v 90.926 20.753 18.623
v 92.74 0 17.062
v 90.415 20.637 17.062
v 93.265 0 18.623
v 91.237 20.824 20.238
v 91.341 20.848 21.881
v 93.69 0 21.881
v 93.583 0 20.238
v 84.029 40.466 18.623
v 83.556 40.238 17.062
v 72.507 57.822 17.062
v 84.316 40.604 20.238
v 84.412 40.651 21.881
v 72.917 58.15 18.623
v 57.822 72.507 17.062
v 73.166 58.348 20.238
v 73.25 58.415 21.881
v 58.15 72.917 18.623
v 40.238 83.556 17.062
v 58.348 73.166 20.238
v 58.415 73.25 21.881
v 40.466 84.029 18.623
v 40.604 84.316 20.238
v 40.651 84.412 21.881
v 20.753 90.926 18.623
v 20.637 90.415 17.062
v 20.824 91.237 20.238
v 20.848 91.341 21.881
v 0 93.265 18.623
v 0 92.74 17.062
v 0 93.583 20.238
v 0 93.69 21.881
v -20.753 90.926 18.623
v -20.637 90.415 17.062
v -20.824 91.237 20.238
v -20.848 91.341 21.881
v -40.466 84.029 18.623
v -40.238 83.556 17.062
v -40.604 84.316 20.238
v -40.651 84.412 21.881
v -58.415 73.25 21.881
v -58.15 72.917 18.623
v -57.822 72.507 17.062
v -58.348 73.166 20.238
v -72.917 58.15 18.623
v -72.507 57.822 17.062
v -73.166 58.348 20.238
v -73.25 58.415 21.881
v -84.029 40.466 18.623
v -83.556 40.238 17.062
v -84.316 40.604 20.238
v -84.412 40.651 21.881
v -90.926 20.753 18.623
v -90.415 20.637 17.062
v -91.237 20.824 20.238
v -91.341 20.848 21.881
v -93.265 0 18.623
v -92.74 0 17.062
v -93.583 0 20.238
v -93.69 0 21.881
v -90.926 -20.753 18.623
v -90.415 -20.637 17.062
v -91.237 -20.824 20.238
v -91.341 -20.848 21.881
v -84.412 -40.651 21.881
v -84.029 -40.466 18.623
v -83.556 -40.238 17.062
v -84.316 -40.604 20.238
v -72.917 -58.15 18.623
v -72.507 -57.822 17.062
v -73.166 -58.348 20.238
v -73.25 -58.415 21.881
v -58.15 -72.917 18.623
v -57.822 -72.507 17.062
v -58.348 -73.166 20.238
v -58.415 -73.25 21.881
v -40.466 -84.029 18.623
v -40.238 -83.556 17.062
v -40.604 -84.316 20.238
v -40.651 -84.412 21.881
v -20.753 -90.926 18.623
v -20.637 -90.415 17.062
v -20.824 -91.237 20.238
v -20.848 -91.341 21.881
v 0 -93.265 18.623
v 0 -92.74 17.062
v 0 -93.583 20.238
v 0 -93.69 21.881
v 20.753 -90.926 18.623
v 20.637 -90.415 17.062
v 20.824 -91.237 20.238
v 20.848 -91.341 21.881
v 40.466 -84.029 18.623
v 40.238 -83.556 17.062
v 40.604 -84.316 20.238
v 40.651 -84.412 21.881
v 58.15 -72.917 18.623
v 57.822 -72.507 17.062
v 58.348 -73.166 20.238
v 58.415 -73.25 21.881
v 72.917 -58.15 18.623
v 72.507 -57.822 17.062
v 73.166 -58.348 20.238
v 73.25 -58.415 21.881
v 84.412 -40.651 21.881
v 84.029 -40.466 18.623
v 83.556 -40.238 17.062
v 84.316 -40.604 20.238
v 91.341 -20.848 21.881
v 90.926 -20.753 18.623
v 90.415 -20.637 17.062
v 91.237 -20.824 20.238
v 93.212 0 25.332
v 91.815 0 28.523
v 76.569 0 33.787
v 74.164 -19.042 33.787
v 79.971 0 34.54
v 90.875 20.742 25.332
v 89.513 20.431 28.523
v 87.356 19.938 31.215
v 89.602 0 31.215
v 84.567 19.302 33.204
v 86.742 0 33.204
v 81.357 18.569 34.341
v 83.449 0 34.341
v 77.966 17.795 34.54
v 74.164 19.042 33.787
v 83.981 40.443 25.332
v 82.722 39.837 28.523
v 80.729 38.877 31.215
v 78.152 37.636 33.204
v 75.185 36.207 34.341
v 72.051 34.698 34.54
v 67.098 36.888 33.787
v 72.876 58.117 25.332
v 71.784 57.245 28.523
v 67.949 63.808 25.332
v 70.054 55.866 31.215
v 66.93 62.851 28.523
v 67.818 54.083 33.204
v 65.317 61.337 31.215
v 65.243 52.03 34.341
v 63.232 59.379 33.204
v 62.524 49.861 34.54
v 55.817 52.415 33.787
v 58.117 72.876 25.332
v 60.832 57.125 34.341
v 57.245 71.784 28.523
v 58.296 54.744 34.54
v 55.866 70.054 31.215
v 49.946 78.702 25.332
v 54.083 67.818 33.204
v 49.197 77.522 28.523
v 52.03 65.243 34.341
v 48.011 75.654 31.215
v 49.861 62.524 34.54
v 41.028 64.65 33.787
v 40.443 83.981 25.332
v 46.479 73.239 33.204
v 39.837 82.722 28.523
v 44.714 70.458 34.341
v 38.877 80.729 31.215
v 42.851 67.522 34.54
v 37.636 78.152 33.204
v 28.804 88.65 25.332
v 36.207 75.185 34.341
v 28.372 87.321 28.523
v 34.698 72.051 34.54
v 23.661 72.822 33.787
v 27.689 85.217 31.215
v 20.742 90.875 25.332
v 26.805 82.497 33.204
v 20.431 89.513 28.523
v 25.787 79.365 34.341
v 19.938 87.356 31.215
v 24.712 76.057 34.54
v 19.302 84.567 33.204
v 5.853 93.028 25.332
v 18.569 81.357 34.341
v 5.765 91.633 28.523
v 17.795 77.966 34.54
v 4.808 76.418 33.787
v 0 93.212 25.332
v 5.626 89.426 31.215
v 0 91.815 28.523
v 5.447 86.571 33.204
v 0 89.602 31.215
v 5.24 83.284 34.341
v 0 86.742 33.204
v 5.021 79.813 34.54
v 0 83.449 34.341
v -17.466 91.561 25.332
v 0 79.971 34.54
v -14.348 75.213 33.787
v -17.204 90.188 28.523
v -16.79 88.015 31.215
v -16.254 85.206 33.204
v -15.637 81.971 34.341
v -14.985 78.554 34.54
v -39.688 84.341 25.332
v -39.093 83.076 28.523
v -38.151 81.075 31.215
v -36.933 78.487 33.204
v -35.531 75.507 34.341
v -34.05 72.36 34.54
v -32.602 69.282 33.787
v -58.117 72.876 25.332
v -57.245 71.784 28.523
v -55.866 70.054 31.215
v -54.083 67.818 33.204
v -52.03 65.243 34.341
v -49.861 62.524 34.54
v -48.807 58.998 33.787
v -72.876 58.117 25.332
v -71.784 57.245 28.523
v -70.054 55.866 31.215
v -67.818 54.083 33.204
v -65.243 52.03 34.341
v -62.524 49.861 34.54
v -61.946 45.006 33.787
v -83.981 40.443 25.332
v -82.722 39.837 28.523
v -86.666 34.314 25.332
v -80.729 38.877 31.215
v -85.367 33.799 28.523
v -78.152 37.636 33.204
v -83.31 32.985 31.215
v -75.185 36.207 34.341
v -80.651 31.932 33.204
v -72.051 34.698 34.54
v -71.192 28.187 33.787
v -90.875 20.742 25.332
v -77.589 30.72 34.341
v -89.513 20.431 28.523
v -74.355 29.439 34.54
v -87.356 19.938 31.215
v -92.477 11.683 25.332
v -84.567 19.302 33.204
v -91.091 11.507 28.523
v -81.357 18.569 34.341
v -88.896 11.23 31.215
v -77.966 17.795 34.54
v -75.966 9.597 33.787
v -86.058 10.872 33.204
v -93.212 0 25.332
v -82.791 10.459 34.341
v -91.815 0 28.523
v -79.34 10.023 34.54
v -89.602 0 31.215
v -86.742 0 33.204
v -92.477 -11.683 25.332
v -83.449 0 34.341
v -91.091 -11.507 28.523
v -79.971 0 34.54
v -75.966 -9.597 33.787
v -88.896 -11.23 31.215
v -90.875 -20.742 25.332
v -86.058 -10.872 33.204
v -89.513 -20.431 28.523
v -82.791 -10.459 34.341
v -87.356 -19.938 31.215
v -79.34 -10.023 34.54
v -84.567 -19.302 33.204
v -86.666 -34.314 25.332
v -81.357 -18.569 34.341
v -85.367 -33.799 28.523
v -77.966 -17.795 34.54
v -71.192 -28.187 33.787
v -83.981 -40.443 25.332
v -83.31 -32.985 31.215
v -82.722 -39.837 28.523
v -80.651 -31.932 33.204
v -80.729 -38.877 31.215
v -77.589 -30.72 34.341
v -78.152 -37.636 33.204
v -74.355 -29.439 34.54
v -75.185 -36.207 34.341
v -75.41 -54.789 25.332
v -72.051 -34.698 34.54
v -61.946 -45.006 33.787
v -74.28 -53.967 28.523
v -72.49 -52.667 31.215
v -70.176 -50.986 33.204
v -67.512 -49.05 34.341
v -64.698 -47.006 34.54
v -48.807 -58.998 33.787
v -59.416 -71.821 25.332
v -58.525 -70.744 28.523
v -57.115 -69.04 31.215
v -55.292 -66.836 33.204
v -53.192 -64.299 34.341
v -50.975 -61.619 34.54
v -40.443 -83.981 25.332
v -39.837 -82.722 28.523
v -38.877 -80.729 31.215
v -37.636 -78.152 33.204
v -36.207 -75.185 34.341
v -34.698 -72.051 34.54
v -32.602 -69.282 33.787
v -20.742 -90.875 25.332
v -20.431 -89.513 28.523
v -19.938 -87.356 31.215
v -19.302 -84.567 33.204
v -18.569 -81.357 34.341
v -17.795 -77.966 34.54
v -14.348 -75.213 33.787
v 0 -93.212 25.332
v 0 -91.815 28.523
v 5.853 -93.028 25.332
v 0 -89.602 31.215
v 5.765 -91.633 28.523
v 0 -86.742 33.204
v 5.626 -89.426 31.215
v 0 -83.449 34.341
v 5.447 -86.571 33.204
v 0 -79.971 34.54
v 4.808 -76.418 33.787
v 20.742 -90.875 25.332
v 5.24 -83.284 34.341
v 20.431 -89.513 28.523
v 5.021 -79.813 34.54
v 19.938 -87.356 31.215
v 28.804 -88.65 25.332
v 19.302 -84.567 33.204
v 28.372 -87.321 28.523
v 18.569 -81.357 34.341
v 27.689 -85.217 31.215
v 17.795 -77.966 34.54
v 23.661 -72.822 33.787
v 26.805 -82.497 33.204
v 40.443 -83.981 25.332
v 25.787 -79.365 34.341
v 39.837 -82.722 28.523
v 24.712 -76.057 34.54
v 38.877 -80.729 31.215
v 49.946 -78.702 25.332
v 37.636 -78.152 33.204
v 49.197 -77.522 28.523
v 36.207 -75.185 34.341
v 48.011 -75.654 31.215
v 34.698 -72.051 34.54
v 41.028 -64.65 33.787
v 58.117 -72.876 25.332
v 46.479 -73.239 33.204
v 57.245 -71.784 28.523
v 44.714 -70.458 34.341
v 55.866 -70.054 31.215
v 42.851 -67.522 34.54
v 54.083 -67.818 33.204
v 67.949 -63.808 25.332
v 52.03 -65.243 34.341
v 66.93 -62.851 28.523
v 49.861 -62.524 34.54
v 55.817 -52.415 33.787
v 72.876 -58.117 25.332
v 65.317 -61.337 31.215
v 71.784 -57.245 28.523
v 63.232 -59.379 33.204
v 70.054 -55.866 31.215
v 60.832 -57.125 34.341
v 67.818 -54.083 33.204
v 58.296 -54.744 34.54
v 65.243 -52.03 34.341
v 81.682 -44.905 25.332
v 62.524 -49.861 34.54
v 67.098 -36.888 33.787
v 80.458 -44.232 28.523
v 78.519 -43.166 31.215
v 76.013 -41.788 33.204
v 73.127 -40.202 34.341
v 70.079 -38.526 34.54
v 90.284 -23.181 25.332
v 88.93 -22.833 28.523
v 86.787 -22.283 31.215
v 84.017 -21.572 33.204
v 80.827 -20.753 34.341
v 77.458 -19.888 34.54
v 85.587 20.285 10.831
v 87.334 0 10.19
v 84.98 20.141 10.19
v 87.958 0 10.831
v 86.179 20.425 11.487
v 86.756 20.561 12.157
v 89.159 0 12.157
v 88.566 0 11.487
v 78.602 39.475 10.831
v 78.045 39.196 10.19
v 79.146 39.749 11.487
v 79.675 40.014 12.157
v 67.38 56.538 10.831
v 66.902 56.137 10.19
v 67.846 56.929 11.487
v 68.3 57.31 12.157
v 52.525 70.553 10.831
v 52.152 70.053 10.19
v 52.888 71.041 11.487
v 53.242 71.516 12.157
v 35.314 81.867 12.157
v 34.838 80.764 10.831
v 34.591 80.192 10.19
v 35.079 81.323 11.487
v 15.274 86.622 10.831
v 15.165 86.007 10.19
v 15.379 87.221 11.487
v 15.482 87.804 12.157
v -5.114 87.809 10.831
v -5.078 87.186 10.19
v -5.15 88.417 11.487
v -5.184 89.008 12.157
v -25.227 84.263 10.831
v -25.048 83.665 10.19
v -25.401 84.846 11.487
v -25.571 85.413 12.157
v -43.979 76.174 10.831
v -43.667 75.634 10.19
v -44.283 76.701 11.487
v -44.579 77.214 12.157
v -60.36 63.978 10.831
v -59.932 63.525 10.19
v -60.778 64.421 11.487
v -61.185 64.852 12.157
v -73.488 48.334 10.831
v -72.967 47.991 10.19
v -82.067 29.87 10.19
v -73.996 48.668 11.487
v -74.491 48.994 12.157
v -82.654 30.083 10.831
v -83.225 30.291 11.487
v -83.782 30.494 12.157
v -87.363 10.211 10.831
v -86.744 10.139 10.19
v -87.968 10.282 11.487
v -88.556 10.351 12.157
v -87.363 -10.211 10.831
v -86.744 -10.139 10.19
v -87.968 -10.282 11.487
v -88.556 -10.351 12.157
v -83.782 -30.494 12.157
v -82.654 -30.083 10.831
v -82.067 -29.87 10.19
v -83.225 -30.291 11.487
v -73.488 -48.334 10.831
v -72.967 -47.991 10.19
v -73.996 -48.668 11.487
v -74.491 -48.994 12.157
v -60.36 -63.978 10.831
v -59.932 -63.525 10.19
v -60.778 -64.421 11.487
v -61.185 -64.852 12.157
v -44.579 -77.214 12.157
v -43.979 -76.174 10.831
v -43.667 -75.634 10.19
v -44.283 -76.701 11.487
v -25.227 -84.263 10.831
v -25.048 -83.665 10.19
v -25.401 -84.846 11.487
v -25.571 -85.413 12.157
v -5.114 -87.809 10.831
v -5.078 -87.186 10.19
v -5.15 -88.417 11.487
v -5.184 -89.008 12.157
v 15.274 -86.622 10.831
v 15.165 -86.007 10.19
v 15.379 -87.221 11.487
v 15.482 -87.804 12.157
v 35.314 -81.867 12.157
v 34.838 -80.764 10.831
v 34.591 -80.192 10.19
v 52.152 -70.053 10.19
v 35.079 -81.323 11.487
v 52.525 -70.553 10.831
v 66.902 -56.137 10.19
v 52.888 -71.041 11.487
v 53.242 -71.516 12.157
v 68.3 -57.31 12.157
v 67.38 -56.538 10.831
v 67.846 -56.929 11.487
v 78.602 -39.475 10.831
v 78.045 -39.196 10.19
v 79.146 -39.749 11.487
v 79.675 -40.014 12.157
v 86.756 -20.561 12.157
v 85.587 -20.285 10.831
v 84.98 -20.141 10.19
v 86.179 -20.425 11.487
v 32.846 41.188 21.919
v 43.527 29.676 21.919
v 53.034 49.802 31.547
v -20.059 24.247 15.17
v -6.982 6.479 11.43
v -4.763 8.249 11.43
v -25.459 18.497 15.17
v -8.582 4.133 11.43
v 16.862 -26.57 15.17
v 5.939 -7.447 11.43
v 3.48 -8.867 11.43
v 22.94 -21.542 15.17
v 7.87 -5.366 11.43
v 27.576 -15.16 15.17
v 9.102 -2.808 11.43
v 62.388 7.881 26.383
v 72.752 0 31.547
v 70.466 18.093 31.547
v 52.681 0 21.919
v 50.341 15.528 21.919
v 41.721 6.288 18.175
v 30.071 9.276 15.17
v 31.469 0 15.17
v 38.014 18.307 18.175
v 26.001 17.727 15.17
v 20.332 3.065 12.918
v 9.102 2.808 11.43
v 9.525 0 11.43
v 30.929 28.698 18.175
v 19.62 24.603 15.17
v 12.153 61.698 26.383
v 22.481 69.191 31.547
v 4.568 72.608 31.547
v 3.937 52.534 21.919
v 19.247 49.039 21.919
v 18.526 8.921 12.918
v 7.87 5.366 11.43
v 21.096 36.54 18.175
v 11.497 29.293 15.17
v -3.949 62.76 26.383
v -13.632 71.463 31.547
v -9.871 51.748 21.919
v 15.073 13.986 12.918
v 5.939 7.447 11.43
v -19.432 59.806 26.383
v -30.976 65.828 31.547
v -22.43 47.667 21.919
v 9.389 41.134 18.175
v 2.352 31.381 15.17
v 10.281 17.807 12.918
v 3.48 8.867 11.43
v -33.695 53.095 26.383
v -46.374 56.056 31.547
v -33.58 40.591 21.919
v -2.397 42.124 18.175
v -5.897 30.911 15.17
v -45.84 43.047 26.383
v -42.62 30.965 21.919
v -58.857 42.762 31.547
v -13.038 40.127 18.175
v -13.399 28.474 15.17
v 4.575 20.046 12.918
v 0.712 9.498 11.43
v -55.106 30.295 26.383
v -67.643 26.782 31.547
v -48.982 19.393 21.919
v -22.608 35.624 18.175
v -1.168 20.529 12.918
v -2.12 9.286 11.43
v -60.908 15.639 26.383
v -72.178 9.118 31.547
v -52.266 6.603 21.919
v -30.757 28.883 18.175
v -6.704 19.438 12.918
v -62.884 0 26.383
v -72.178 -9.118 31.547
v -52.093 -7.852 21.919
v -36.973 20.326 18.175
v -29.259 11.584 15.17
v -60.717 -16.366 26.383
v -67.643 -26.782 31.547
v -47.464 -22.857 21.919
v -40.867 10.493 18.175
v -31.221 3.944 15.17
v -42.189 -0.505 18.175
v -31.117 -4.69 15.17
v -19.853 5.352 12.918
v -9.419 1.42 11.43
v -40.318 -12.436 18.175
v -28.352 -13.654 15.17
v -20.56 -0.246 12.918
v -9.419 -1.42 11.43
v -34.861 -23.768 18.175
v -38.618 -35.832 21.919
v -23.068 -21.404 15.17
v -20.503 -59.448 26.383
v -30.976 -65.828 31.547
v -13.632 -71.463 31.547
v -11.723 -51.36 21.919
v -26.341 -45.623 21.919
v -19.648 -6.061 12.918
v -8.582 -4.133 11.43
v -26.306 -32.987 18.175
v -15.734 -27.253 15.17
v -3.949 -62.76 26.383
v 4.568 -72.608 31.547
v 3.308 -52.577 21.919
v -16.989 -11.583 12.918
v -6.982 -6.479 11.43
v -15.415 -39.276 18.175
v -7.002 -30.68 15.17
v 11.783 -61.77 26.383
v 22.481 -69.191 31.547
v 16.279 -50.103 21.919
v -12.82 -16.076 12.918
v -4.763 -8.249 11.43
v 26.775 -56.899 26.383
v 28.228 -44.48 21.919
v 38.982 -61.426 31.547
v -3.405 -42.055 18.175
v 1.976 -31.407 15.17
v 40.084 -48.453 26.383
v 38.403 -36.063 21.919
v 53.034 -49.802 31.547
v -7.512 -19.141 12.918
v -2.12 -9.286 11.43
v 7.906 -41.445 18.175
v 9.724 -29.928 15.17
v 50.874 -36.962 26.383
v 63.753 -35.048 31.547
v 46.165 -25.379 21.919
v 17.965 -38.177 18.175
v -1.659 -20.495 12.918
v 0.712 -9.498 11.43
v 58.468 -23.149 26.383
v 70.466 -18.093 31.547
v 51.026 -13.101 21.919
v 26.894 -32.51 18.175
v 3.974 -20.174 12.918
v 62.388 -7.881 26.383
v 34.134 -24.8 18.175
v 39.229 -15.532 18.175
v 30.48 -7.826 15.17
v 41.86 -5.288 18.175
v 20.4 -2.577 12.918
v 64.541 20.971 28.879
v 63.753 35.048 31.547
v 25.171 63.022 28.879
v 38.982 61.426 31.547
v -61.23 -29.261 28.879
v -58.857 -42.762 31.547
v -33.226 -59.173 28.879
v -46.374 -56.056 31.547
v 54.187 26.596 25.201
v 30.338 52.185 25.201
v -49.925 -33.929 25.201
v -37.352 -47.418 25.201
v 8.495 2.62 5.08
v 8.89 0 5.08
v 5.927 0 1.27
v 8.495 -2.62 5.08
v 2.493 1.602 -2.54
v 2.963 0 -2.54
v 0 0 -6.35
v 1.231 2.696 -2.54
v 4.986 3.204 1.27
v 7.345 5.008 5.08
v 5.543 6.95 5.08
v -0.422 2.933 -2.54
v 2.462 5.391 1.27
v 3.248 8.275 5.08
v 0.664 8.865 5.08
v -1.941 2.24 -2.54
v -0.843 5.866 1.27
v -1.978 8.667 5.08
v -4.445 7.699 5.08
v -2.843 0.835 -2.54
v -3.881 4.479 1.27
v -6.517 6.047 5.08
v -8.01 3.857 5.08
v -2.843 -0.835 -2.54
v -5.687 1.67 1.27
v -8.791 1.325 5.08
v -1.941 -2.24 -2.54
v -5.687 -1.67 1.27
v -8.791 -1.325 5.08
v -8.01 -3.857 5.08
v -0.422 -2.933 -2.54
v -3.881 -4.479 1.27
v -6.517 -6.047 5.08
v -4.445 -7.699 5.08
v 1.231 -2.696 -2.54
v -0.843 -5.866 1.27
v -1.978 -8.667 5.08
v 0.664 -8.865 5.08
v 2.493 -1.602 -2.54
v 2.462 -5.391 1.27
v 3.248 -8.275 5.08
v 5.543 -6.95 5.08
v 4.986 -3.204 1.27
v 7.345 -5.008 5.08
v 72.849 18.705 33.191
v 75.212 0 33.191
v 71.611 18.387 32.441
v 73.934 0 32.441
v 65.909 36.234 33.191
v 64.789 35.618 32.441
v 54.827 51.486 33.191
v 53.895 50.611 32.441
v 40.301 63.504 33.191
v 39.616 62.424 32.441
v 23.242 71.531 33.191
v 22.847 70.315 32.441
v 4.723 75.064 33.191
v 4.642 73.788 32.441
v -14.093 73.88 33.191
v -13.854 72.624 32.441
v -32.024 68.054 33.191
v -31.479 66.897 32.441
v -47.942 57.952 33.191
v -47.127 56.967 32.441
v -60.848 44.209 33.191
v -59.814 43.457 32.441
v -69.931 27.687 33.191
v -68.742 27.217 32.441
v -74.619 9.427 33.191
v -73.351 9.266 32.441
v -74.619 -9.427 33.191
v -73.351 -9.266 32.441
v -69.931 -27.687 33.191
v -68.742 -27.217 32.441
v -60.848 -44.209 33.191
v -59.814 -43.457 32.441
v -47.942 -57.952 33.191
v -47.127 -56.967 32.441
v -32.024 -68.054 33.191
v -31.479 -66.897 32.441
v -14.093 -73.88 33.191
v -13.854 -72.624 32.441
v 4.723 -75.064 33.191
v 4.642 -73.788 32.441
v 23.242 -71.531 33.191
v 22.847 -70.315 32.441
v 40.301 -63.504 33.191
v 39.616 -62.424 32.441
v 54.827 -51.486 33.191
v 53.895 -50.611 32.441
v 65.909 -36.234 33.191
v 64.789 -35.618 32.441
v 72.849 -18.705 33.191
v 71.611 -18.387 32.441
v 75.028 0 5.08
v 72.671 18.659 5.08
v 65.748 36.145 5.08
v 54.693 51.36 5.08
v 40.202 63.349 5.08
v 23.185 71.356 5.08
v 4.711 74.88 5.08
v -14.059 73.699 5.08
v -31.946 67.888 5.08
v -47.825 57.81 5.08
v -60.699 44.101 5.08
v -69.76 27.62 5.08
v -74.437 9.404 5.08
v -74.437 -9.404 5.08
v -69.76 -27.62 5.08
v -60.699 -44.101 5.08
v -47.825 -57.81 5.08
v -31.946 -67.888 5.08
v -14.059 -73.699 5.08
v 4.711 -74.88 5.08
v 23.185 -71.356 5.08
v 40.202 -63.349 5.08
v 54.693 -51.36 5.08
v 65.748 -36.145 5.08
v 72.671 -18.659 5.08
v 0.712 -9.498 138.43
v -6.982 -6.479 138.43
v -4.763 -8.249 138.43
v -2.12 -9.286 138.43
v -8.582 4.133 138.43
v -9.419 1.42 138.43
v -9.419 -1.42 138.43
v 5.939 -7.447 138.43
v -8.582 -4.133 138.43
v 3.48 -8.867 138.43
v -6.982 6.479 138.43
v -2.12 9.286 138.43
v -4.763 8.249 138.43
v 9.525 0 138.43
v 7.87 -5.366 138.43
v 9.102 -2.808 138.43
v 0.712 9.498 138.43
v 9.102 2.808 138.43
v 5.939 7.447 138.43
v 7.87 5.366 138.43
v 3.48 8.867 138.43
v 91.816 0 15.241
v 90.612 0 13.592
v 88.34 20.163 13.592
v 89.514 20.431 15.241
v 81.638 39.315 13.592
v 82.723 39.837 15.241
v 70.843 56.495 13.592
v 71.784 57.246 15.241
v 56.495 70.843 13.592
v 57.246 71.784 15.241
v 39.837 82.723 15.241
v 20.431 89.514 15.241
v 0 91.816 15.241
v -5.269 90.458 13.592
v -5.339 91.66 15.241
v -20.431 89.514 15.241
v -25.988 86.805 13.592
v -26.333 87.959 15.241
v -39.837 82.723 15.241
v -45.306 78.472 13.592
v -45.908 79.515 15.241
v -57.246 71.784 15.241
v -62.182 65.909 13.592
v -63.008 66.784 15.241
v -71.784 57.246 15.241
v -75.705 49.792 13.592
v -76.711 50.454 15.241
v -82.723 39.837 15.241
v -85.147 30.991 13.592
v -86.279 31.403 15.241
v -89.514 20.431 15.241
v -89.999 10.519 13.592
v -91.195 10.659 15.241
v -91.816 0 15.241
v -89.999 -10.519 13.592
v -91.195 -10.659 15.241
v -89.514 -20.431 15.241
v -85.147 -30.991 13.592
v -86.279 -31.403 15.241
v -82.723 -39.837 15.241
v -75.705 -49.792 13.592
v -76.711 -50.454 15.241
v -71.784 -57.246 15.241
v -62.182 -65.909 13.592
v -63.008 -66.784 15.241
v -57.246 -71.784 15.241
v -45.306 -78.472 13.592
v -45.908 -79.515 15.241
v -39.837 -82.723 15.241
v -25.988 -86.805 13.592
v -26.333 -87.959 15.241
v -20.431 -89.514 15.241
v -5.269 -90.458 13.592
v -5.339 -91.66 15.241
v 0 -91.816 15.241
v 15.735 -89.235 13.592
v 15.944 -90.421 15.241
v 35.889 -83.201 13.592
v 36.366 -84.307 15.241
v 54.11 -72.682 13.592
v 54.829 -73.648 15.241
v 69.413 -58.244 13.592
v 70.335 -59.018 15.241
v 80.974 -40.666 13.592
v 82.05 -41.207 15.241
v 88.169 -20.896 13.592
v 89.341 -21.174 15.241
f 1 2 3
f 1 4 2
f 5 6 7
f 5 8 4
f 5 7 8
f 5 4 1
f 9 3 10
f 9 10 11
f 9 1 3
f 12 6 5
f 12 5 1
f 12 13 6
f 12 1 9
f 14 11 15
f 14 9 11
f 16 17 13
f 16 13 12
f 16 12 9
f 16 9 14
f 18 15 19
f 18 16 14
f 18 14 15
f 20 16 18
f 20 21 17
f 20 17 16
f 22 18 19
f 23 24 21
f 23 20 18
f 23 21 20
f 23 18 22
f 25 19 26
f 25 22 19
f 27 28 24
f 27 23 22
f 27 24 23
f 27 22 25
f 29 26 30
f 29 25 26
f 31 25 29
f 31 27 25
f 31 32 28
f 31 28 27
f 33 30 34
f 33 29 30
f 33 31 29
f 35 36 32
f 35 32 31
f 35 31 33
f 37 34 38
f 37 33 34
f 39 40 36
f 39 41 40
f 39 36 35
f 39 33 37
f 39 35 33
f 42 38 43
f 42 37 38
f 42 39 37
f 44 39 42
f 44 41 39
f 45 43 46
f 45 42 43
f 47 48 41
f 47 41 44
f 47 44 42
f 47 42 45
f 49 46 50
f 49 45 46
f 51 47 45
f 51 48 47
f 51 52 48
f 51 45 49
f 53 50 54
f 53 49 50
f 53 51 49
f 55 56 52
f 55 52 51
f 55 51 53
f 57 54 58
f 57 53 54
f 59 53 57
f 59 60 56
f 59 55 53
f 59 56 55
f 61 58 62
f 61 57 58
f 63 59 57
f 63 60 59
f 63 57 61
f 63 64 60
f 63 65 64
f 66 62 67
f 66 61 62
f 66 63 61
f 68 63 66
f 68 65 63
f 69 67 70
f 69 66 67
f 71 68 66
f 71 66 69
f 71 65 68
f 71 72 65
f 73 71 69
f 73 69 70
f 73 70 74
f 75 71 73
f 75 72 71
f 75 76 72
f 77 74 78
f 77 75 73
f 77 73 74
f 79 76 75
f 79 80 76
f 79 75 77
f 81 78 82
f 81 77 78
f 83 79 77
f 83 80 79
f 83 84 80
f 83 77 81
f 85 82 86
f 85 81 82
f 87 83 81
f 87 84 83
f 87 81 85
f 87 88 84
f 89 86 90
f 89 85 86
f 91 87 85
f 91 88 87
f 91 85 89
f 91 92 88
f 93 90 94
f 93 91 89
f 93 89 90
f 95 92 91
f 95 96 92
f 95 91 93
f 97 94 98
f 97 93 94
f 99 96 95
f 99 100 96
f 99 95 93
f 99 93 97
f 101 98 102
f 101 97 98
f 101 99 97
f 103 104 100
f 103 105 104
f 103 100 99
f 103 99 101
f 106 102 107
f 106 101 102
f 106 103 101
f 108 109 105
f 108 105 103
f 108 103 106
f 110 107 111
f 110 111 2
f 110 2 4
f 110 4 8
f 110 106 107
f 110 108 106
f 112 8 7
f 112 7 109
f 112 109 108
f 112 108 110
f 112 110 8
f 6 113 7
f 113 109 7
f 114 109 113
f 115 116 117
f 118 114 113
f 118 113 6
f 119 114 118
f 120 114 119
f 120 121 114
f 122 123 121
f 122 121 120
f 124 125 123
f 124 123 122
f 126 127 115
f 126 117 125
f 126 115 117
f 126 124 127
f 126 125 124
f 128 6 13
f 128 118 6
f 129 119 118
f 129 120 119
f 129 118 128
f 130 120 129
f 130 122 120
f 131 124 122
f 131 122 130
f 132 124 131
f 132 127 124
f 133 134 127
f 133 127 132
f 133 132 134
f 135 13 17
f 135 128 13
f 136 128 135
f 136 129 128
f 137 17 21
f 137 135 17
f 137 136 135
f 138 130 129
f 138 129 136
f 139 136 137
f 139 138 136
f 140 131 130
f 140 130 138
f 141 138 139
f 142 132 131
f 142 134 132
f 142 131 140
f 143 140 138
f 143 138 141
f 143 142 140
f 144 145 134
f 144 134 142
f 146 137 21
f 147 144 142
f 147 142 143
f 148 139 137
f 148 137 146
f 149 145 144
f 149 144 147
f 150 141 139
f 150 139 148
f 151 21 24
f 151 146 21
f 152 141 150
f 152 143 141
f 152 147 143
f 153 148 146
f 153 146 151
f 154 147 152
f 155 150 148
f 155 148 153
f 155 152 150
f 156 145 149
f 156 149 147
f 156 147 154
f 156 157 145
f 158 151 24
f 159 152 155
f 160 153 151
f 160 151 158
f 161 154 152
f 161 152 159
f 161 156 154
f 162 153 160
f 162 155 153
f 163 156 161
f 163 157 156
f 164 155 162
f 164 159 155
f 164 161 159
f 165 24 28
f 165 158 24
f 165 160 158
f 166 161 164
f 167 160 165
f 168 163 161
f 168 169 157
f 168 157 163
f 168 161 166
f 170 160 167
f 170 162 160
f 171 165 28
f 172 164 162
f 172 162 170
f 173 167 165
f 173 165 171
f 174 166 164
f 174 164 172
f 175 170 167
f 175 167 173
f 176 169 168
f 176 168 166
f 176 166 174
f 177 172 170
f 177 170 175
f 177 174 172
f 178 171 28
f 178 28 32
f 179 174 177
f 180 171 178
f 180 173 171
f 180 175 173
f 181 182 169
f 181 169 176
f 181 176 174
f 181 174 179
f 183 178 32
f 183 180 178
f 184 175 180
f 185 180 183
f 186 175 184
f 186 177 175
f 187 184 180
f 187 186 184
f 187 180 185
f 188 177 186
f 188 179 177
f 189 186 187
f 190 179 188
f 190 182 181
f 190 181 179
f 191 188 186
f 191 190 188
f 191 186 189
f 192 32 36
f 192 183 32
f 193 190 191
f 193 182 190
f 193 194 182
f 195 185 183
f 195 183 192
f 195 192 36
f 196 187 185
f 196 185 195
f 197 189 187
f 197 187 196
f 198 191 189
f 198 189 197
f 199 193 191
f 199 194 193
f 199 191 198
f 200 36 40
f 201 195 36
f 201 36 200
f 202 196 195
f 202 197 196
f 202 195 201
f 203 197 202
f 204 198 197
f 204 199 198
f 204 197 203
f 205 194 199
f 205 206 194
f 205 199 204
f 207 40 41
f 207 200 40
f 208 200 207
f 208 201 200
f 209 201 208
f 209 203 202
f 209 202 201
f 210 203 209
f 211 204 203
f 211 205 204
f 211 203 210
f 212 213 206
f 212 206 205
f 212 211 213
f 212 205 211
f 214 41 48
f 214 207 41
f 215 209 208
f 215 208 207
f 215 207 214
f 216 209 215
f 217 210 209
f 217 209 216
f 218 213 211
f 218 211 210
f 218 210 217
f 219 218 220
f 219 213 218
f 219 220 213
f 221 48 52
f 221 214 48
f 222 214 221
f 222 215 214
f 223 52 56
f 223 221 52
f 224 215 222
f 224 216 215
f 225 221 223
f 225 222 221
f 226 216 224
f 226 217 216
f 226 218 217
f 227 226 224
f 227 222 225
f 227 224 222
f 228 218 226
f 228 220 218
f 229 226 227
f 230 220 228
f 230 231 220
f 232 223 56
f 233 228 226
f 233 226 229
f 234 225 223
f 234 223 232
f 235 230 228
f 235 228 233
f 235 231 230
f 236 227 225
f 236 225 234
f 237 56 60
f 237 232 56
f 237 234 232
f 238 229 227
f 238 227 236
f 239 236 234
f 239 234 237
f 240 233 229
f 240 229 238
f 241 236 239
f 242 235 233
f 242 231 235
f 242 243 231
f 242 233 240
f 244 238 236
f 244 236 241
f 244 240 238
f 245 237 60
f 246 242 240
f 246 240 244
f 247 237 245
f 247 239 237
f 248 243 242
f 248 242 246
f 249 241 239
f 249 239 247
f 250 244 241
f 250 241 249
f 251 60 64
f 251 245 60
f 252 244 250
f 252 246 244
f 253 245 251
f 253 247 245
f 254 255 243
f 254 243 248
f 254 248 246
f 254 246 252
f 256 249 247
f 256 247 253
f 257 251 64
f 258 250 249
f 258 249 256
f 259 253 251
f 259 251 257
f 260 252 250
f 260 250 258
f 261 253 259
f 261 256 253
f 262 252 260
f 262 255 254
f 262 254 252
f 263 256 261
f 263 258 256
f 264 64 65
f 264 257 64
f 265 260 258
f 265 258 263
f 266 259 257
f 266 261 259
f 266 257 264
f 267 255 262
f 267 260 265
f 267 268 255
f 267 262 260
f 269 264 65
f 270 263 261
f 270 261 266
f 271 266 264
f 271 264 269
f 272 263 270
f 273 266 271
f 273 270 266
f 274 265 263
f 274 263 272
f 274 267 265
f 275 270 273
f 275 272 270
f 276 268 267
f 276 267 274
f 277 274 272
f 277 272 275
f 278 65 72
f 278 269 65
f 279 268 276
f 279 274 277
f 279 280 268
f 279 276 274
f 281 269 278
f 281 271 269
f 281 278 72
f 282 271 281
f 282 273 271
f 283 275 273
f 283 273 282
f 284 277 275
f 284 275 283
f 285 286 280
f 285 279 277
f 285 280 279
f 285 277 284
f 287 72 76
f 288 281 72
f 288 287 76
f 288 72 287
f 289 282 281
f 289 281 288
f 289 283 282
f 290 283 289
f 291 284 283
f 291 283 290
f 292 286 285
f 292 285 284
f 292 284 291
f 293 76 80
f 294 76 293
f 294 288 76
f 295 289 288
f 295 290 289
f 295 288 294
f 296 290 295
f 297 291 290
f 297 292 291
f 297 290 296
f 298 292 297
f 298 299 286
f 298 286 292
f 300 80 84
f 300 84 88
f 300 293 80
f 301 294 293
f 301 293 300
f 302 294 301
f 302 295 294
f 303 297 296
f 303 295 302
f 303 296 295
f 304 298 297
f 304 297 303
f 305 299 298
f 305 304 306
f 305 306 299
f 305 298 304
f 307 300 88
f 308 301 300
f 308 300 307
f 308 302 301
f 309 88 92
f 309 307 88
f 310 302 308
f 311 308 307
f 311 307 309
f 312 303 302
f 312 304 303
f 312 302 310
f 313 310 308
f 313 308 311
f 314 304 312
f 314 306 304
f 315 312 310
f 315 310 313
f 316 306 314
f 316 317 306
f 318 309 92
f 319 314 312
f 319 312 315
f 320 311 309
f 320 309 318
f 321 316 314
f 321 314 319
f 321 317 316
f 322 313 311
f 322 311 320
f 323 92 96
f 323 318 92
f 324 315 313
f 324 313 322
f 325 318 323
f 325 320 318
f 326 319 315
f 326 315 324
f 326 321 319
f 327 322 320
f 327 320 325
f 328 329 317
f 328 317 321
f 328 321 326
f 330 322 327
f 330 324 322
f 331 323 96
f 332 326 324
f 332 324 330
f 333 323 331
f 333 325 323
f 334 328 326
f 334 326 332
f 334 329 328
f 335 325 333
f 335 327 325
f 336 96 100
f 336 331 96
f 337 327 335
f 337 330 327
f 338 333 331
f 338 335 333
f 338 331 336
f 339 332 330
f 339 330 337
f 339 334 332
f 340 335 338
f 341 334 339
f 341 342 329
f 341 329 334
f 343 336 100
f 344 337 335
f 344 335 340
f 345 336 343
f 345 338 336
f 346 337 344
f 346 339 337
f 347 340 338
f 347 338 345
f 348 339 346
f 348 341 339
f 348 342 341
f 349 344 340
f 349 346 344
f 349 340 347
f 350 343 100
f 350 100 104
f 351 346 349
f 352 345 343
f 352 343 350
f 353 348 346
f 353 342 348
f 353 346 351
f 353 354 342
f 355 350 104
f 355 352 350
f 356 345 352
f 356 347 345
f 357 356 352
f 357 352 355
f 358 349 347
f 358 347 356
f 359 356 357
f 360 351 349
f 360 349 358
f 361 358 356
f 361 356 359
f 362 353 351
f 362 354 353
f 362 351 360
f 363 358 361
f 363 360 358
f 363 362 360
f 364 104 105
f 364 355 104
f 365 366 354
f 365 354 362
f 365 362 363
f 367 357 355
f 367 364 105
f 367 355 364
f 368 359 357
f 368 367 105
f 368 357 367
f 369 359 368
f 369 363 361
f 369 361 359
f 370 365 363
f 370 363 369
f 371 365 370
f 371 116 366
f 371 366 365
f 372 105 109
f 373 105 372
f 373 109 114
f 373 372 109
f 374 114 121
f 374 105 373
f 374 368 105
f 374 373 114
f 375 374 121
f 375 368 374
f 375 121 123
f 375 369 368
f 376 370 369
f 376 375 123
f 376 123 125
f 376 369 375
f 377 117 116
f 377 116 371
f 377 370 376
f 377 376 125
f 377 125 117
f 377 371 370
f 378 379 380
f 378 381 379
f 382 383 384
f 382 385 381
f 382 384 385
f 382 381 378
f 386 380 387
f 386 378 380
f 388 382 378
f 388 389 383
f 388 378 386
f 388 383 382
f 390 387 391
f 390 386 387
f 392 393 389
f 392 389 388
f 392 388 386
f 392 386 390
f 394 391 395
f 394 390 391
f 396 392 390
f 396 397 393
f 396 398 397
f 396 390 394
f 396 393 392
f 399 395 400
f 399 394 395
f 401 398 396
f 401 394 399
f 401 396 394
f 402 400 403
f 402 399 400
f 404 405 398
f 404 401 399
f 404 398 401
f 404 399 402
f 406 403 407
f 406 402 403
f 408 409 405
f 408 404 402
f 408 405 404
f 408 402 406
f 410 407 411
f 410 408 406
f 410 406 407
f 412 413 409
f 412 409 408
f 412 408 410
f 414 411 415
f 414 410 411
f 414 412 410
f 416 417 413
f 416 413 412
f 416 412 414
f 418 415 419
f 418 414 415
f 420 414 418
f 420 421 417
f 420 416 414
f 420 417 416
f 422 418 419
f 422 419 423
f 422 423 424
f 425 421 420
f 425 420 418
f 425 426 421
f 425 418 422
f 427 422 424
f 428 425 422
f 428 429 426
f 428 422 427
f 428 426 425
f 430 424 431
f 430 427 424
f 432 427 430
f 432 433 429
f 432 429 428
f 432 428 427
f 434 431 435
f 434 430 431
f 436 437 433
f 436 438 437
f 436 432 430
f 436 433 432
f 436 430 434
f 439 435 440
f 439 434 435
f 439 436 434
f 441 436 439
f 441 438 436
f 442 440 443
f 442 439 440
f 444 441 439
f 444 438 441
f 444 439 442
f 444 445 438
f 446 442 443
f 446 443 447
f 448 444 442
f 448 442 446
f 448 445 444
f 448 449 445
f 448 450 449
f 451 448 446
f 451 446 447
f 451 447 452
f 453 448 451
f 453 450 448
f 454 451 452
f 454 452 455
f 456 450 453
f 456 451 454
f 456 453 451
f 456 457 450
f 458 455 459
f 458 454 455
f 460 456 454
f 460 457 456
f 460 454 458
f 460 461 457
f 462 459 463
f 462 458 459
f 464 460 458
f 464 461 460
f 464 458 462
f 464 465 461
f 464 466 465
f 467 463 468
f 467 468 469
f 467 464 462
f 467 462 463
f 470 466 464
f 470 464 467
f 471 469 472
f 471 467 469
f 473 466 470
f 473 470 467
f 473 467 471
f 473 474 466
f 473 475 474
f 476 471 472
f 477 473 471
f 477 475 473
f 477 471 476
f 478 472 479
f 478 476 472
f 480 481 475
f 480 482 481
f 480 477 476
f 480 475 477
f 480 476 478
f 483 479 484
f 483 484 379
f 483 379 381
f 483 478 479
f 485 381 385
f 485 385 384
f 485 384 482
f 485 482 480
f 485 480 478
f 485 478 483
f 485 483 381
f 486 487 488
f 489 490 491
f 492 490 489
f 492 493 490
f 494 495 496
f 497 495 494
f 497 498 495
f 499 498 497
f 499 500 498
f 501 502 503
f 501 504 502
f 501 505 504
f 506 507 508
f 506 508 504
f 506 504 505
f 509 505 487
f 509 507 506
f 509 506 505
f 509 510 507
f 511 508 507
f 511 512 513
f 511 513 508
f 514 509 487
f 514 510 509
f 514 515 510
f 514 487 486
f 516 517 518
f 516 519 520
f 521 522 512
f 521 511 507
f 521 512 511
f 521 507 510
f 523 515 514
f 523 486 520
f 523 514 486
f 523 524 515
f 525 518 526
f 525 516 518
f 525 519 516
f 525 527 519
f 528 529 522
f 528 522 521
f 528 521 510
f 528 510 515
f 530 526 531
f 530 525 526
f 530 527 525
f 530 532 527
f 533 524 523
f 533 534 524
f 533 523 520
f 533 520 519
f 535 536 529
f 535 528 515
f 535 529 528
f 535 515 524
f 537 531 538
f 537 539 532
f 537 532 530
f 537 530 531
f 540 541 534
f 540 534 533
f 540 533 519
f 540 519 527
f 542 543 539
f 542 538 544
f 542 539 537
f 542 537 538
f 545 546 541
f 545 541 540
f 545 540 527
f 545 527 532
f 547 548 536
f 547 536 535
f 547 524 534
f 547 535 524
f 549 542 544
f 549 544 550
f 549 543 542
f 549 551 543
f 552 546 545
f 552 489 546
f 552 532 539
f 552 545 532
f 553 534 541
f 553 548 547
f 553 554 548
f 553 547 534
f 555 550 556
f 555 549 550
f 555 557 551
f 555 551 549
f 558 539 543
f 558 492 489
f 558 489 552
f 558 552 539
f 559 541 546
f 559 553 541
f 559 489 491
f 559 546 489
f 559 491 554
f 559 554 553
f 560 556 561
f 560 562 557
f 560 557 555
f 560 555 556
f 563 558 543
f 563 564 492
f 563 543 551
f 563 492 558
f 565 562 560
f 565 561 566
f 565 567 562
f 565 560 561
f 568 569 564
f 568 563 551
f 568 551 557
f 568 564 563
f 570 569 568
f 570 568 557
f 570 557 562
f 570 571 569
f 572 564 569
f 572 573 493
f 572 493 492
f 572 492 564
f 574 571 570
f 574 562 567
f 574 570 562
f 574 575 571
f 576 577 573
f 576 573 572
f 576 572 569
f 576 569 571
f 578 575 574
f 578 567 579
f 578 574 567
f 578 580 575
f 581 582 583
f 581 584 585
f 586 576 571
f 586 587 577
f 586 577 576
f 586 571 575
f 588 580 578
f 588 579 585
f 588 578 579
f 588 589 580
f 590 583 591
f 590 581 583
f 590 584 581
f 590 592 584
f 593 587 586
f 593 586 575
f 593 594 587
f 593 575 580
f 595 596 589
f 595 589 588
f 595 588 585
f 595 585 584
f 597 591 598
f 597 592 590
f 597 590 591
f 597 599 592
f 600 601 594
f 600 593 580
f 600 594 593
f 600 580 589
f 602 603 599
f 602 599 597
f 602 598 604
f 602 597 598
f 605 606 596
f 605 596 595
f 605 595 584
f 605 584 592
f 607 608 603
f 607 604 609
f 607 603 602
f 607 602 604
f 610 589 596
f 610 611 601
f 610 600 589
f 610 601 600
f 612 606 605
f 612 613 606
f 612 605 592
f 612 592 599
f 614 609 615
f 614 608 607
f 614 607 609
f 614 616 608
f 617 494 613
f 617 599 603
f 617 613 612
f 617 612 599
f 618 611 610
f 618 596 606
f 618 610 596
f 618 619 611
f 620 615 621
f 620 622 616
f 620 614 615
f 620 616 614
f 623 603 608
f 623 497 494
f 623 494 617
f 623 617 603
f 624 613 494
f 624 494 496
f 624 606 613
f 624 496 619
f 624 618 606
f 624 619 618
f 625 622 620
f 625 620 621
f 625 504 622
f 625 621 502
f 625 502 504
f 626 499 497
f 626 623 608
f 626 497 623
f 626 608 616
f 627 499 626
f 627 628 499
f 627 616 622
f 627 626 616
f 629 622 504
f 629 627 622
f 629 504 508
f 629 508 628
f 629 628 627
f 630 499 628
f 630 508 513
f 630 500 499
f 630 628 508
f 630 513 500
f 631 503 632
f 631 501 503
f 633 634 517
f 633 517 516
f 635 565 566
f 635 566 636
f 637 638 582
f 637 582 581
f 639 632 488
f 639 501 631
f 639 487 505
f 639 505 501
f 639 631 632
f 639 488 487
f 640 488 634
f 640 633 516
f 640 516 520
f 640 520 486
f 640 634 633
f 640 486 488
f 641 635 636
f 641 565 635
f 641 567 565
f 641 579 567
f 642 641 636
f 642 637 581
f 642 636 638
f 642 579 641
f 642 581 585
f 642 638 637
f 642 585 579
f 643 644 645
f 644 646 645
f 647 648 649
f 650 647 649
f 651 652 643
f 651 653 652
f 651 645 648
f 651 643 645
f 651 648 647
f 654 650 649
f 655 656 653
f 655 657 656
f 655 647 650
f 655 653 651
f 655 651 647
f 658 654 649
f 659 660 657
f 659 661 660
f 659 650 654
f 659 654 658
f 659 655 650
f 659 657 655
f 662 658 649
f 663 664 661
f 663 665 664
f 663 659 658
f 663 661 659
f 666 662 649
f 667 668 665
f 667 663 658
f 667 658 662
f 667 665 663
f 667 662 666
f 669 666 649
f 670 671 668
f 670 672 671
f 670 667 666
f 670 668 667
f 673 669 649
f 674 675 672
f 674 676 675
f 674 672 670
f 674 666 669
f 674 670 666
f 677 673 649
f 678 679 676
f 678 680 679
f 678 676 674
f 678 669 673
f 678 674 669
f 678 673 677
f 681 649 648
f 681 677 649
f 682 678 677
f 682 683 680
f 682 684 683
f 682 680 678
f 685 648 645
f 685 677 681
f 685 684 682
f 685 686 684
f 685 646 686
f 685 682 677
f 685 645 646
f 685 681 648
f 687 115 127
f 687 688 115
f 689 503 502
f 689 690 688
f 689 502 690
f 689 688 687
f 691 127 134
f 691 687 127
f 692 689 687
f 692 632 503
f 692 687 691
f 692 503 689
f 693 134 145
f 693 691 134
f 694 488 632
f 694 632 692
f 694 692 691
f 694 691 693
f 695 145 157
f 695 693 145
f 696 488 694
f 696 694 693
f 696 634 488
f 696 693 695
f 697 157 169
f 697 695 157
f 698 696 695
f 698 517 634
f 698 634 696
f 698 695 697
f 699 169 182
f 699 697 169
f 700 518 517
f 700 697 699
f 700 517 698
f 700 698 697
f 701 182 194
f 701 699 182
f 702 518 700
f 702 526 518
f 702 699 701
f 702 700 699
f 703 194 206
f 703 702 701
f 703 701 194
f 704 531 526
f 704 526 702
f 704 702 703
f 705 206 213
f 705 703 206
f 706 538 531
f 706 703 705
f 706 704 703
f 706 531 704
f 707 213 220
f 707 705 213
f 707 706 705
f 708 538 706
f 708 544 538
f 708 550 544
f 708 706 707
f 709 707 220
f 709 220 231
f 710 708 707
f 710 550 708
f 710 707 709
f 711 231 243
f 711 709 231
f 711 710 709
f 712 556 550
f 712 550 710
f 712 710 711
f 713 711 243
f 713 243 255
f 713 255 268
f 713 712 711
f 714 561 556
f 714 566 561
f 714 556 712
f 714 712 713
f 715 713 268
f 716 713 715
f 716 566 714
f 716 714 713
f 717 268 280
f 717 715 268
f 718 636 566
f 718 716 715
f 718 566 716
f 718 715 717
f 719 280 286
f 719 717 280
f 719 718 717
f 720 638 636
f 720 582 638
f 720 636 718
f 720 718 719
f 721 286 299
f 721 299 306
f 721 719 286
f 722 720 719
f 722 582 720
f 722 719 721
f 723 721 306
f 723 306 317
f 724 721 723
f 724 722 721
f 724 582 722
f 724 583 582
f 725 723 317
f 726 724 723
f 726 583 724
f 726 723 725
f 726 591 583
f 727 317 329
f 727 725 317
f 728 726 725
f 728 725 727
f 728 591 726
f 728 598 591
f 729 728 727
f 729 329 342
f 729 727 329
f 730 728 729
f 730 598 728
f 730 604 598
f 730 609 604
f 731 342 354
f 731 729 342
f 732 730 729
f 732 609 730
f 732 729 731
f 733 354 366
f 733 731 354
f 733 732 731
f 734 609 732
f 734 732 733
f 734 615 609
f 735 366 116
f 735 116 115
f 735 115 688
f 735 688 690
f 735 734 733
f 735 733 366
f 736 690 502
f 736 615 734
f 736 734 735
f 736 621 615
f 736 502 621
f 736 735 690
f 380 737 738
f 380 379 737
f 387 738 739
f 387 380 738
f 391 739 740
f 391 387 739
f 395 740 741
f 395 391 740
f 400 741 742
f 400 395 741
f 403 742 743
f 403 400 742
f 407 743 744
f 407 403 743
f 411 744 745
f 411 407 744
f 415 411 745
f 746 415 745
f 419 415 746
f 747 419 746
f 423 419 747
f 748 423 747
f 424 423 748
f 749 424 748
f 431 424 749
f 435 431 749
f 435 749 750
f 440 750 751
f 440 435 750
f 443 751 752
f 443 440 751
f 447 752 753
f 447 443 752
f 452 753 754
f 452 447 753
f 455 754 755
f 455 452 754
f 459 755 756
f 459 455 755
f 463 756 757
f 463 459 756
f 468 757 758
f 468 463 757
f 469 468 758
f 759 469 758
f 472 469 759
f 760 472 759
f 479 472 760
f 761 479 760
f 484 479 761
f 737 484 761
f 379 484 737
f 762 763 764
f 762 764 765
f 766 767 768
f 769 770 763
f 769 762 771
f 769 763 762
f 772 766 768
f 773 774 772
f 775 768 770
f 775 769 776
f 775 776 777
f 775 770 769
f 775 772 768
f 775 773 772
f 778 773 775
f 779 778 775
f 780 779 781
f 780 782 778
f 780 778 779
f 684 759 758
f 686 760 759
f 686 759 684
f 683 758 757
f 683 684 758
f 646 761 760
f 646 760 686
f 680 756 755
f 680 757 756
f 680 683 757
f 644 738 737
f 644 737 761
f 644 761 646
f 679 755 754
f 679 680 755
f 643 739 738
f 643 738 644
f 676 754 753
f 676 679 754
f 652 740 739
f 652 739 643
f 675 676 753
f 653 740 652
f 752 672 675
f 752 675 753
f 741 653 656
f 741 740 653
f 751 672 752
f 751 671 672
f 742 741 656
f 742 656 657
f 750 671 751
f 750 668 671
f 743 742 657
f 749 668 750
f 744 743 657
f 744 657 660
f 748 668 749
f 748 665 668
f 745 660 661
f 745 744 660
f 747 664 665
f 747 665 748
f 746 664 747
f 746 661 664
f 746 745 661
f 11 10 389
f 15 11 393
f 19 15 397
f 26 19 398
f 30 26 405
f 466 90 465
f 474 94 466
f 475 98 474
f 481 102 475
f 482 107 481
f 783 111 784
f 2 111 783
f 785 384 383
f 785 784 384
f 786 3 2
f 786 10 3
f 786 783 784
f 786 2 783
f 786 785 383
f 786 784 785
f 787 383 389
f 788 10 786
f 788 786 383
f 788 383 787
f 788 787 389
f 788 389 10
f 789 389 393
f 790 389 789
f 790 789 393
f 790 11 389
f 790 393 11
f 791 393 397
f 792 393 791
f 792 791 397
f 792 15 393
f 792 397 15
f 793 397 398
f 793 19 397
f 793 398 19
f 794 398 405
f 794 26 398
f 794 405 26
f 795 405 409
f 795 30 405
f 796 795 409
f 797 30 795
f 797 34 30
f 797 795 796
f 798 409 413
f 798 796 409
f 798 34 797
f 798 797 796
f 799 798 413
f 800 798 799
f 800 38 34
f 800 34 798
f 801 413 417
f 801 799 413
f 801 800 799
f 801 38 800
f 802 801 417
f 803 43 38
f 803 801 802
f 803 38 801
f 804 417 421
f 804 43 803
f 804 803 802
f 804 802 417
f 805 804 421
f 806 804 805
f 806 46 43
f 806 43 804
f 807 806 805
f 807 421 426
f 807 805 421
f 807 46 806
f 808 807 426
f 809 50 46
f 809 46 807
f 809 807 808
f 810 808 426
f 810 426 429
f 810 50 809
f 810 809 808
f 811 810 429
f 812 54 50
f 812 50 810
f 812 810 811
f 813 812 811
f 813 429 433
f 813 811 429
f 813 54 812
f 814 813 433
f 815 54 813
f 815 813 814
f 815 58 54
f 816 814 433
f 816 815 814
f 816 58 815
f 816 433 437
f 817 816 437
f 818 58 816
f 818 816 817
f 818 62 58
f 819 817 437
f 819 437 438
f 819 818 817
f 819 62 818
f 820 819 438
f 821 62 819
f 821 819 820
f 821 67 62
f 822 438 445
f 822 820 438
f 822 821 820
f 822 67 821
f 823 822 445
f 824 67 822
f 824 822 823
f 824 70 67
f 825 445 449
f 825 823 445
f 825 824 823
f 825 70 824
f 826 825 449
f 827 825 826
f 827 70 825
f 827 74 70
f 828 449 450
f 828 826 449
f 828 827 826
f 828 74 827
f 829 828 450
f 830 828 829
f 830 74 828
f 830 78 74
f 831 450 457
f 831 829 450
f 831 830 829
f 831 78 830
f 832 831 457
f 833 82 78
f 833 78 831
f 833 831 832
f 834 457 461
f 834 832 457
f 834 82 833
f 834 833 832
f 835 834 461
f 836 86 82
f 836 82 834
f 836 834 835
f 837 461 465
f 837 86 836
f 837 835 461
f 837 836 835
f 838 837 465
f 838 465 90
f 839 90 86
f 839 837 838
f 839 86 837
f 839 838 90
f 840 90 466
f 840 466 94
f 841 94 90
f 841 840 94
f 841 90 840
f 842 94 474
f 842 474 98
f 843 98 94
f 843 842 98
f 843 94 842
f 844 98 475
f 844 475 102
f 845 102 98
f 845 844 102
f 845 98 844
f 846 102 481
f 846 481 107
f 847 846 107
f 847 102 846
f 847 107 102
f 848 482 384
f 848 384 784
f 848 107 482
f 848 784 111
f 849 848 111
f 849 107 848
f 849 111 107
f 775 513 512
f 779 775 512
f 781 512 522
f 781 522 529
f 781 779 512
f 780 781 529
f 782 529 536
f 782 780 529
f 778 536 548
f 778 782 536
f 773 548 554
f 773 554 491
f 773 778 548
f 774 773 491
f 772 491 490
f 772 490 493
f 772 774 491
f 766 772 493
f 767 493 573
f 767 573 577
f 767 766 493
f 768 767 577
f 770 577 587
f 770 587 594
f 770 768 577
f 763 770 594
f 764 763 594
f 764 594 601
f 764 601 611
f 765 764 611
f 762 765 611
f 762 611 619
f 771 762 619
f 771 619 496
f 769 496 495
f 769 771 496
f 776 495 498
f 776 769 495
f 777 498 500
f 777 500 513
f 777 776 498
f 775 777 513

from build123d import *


# Not quite as in the source:
# - a fillet or chamfer that OpenCascade refuses, or shapes differently, is made with other operations: its cross-section is extruded or revolved along the edge and cut away or added


with BuildPart() as f1:
    # F0 (on Front) → F1 (revolve)
    with BuildSketch(Plane.XZ):
        with BuildLine():
            ThreePointArc((72.7515336349, 31.5465186996), (42.1923391821, 18.1752933834), (9.525, 11.43))
            Line((9.525, 11.43), (9.525, 138.43))
            Line((9.525, 138.43), (0, 138.43))
            Line((0, 138.43), (0, 5.08))
            Line((0, 5.08), (8.89, 5.08))
            Line((8.89, 5.08), (80.9900359946, 5.08))
            ThreePointArc((80.9900359946, 5.08), (85.3313804759, 8.3219837991), (89.1588856559, 12.1570763605))
            ThreePointArc((89.1588856559, 12.1570763605), (71.2952522719, 13.6775386544), (72.7515336349, 31.5465186996))
        make_face()
        with BuildLine():
            ThreePointArc((76.5693657258, 33.7870508297), (74.5620768343, 32.8344105725), (72.7515336349, 31.5465186996))
            ThreePointArc((72.7515336349, 31.5465186996), (74.6681976781, 32.6535822964), (76.5693657258, 33.7870508297))
        make_face()
        with BuildLine():
            ThreePointArc((76.5693657258, 33.7870508297), (74.6681976781, 32.6535822964), (72.7515336349, 31.5465186996))
            ThreePointArc((72.7515336349, 31.5465186996), (71.2952522719, 13.6775386544), (89.1588856559, 12.1570763605))
            ThreePointArc((89.1588856559, 12.1570763605), (91.0491403746, 14.536624633), (92.7400229866, 17.0617442093))
            ThreePointArc((92.7400229866, 17.0617442093), (93.4502694354, 19.4251359639), (93.6900359946, 21.8812675974))
            ThreePointArc((93.6900359946, 21.8812675974), (88.2408113871, 32.3079763881), (76.5693657258, 33.7870508297))
        make_face()
        with BuildLine():
            ThreePointArc((92.7400229866, 17.0617442093), (91.0491403746, 14.536624633), (89.1588856559, 12.1570763605))
            ThreePointArc((89.1588856559, 12.1570763605), (91.2469339214, 14.3922059126), (92.7400229866, 17.0617442093))
        make_face()
        Polygon((8.89, 5.08), (0, 5.08), (0, 0), (0, -6.35), align=None)
    revolve(axis=Axis((0, 0, 4.7224786045), (0, 0, 1)))

    # F2: chamfer of 5.08 on 1 edges, made by hand

    # F2_s1 → F2_t2 (revolve, cut)
    with BuildSketch(Plane.XZ):
        with BuildLine():
            Line((74.8406610891, 5.0020764693), (87.521834843, 10.2676383795))
            Line((87.521834843, 10.2676383795), (87.5938009931, 10.1959206464))
            ThreePointArc((87.5938009931, 10.1959206464), (84.4417917383, 7.4442968535), (81.044772889, 4.9944054185))
            Line((81.044772889, 4.9944054185), (80.9900359946, 4.9784))
            ThreePointArc((80.9900359946, 4.9784), (77.9153485418, 4.9784), (74.8406610891, 4.9004764693))
            Line((74.8406610891, 4.9004764693), (74.8406610891, 5.0020764693))
        make_face()
    revolve(axis=Axis((0, 0, 5.08), (0, 0, 1)), mode=Mode.SUBTRACT)


solid = f1.part
